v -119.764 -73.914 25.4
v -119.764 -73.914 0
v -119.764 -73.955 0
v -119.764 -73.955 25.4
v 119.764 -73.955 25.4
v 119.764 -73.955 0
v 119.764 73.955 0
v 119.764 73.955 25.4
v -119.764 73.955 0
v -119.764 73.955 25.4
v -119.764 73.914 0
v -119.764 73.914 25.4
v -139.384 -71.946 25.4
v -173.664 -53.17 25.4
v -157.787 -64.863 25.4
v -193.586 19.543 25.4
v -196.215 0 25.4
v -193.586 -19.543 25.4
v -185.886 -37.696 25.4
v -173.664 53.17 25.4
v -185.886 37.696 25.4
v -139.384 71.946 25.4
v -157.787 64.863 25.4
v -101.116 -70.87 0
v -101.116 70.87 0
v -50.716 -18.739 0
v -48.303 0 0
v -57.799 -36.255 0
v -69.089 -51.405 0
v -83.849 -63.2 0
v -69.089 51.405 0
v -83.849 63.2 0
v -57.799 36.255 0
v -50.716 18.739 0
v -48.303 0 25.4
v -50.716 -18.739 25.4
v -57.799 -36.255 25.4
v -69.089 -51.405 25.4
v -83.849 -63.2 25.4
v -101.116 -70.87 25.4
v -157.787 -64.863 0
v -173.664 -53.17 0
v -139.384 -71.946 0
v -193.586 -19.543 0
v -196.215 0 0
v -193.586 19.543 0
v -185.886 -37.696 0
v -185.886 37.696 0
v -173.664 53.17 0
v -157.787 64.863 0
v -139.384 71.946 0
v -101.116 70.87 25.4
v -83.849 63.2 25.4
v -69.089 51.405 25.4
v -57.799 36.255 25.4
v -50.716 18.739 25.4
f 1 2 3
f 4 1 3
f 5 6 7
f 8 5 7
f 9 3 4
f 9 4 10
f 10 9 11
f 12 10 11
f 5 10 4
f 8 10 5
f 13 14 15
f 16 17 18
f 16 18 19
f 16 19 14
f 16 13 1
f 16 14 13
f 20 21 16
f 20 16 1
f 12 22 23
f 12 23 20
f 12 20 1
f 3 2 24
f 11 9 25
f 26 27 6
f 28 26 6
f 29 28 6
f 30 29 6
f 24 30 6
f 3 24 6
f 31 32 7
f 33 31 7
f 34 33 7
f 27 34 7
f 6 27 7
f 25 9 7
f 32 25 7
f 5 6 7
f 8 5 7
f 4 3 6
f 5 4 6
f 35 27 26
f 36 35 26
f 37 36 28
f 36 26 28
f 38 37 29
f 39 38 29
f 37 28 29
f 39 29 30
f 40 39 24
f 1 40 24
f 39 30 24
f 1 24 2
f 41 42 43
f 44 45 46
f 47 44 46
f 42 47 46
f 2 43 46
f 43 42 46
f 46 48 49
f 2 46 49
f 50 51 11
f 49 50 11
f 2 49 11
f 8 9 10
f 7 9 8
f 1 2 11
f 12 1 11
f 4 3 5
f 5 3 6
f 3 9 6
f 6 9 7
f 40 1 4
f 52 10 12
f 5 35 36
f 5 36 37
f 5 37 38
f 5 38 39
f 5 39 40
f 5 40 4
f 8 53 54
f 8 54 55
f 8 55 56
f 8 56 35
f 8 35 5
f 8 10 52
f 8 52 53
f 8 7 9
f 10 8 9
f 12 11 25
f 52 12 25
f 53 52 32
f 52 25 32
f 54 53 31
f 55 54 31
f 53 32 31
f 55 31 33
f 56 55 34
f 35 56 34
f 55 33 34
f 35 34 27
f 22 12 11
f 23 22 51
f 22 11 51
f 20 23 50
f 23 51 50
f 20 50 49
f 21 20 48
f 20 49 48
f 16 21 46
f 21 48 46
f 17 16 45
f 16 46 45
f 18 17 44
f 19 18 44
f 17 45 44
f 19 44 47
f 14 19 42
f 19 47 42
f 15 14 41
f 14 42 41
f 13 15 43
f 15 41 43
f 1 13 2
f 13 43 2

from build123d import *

# Parameters (mm, degrees)
F3_DEPTH = 25.4
F0_W     = 239.5271062851
F0_H     = 147.9100286961


with BuildPart() as f3:
    # F1 (on face) → F3 (new body)
    with BuildSketch(Plane.XY):
        with BuildLine():
            ThreePointArc((-119.7635531425, 73.9138036714), (-69.089071119, 51.4050164222), (-48.3027073577, 0))
            ThreePointArc((-48.3027073577, 0), (-69.089071119, -51.4050164222), (-119.7635531425, -73.9138036714))
            Line((-119.7635531425, -73.9138036714), (-119.7635531425, -73.955014348))
            Line((-119.7635531425, -73.955014348), (119.7635531425, -73.955014348))
            Line((119.7635531425, -73.955014348), (119.7635531425, 73.955014348))
            Line((119.7635531425, 73.955014348), (-119.7635531425, 73.955014348))
            Line((-119.7635531425, 73.955014348), (-119.7635531425, 73.9138036714))
        make_face()
    extrude(amount=F3_DEPTH)


with BuildPart() as f3b:
    # F1 (on face) → F3, piece 2 (new body)
    with BuildSketch(Plane.XY):
        with BuildLine():
            Line((-119.7635531425, -73.9138036714), (-119.7635531425, 73.9138036714))
            ThreePointArc((-119.7635531425, 73.9138036714), (-196.2145146891, 0), (-119.7635531425, -73.9138036714))
        make_face()
    extrude(amount=F3_DEPTH)


with BuildPart() as f3c:
    # F0 (on Top) → F3, piece 3 (new body)
    with BuildSketch(Plane.XY):
        Rectangle(F0_W, F0_H)
    extrude(amount=F3_DEPTH)


solid = Compound([f3.part, f3b.part, f3c.part])
